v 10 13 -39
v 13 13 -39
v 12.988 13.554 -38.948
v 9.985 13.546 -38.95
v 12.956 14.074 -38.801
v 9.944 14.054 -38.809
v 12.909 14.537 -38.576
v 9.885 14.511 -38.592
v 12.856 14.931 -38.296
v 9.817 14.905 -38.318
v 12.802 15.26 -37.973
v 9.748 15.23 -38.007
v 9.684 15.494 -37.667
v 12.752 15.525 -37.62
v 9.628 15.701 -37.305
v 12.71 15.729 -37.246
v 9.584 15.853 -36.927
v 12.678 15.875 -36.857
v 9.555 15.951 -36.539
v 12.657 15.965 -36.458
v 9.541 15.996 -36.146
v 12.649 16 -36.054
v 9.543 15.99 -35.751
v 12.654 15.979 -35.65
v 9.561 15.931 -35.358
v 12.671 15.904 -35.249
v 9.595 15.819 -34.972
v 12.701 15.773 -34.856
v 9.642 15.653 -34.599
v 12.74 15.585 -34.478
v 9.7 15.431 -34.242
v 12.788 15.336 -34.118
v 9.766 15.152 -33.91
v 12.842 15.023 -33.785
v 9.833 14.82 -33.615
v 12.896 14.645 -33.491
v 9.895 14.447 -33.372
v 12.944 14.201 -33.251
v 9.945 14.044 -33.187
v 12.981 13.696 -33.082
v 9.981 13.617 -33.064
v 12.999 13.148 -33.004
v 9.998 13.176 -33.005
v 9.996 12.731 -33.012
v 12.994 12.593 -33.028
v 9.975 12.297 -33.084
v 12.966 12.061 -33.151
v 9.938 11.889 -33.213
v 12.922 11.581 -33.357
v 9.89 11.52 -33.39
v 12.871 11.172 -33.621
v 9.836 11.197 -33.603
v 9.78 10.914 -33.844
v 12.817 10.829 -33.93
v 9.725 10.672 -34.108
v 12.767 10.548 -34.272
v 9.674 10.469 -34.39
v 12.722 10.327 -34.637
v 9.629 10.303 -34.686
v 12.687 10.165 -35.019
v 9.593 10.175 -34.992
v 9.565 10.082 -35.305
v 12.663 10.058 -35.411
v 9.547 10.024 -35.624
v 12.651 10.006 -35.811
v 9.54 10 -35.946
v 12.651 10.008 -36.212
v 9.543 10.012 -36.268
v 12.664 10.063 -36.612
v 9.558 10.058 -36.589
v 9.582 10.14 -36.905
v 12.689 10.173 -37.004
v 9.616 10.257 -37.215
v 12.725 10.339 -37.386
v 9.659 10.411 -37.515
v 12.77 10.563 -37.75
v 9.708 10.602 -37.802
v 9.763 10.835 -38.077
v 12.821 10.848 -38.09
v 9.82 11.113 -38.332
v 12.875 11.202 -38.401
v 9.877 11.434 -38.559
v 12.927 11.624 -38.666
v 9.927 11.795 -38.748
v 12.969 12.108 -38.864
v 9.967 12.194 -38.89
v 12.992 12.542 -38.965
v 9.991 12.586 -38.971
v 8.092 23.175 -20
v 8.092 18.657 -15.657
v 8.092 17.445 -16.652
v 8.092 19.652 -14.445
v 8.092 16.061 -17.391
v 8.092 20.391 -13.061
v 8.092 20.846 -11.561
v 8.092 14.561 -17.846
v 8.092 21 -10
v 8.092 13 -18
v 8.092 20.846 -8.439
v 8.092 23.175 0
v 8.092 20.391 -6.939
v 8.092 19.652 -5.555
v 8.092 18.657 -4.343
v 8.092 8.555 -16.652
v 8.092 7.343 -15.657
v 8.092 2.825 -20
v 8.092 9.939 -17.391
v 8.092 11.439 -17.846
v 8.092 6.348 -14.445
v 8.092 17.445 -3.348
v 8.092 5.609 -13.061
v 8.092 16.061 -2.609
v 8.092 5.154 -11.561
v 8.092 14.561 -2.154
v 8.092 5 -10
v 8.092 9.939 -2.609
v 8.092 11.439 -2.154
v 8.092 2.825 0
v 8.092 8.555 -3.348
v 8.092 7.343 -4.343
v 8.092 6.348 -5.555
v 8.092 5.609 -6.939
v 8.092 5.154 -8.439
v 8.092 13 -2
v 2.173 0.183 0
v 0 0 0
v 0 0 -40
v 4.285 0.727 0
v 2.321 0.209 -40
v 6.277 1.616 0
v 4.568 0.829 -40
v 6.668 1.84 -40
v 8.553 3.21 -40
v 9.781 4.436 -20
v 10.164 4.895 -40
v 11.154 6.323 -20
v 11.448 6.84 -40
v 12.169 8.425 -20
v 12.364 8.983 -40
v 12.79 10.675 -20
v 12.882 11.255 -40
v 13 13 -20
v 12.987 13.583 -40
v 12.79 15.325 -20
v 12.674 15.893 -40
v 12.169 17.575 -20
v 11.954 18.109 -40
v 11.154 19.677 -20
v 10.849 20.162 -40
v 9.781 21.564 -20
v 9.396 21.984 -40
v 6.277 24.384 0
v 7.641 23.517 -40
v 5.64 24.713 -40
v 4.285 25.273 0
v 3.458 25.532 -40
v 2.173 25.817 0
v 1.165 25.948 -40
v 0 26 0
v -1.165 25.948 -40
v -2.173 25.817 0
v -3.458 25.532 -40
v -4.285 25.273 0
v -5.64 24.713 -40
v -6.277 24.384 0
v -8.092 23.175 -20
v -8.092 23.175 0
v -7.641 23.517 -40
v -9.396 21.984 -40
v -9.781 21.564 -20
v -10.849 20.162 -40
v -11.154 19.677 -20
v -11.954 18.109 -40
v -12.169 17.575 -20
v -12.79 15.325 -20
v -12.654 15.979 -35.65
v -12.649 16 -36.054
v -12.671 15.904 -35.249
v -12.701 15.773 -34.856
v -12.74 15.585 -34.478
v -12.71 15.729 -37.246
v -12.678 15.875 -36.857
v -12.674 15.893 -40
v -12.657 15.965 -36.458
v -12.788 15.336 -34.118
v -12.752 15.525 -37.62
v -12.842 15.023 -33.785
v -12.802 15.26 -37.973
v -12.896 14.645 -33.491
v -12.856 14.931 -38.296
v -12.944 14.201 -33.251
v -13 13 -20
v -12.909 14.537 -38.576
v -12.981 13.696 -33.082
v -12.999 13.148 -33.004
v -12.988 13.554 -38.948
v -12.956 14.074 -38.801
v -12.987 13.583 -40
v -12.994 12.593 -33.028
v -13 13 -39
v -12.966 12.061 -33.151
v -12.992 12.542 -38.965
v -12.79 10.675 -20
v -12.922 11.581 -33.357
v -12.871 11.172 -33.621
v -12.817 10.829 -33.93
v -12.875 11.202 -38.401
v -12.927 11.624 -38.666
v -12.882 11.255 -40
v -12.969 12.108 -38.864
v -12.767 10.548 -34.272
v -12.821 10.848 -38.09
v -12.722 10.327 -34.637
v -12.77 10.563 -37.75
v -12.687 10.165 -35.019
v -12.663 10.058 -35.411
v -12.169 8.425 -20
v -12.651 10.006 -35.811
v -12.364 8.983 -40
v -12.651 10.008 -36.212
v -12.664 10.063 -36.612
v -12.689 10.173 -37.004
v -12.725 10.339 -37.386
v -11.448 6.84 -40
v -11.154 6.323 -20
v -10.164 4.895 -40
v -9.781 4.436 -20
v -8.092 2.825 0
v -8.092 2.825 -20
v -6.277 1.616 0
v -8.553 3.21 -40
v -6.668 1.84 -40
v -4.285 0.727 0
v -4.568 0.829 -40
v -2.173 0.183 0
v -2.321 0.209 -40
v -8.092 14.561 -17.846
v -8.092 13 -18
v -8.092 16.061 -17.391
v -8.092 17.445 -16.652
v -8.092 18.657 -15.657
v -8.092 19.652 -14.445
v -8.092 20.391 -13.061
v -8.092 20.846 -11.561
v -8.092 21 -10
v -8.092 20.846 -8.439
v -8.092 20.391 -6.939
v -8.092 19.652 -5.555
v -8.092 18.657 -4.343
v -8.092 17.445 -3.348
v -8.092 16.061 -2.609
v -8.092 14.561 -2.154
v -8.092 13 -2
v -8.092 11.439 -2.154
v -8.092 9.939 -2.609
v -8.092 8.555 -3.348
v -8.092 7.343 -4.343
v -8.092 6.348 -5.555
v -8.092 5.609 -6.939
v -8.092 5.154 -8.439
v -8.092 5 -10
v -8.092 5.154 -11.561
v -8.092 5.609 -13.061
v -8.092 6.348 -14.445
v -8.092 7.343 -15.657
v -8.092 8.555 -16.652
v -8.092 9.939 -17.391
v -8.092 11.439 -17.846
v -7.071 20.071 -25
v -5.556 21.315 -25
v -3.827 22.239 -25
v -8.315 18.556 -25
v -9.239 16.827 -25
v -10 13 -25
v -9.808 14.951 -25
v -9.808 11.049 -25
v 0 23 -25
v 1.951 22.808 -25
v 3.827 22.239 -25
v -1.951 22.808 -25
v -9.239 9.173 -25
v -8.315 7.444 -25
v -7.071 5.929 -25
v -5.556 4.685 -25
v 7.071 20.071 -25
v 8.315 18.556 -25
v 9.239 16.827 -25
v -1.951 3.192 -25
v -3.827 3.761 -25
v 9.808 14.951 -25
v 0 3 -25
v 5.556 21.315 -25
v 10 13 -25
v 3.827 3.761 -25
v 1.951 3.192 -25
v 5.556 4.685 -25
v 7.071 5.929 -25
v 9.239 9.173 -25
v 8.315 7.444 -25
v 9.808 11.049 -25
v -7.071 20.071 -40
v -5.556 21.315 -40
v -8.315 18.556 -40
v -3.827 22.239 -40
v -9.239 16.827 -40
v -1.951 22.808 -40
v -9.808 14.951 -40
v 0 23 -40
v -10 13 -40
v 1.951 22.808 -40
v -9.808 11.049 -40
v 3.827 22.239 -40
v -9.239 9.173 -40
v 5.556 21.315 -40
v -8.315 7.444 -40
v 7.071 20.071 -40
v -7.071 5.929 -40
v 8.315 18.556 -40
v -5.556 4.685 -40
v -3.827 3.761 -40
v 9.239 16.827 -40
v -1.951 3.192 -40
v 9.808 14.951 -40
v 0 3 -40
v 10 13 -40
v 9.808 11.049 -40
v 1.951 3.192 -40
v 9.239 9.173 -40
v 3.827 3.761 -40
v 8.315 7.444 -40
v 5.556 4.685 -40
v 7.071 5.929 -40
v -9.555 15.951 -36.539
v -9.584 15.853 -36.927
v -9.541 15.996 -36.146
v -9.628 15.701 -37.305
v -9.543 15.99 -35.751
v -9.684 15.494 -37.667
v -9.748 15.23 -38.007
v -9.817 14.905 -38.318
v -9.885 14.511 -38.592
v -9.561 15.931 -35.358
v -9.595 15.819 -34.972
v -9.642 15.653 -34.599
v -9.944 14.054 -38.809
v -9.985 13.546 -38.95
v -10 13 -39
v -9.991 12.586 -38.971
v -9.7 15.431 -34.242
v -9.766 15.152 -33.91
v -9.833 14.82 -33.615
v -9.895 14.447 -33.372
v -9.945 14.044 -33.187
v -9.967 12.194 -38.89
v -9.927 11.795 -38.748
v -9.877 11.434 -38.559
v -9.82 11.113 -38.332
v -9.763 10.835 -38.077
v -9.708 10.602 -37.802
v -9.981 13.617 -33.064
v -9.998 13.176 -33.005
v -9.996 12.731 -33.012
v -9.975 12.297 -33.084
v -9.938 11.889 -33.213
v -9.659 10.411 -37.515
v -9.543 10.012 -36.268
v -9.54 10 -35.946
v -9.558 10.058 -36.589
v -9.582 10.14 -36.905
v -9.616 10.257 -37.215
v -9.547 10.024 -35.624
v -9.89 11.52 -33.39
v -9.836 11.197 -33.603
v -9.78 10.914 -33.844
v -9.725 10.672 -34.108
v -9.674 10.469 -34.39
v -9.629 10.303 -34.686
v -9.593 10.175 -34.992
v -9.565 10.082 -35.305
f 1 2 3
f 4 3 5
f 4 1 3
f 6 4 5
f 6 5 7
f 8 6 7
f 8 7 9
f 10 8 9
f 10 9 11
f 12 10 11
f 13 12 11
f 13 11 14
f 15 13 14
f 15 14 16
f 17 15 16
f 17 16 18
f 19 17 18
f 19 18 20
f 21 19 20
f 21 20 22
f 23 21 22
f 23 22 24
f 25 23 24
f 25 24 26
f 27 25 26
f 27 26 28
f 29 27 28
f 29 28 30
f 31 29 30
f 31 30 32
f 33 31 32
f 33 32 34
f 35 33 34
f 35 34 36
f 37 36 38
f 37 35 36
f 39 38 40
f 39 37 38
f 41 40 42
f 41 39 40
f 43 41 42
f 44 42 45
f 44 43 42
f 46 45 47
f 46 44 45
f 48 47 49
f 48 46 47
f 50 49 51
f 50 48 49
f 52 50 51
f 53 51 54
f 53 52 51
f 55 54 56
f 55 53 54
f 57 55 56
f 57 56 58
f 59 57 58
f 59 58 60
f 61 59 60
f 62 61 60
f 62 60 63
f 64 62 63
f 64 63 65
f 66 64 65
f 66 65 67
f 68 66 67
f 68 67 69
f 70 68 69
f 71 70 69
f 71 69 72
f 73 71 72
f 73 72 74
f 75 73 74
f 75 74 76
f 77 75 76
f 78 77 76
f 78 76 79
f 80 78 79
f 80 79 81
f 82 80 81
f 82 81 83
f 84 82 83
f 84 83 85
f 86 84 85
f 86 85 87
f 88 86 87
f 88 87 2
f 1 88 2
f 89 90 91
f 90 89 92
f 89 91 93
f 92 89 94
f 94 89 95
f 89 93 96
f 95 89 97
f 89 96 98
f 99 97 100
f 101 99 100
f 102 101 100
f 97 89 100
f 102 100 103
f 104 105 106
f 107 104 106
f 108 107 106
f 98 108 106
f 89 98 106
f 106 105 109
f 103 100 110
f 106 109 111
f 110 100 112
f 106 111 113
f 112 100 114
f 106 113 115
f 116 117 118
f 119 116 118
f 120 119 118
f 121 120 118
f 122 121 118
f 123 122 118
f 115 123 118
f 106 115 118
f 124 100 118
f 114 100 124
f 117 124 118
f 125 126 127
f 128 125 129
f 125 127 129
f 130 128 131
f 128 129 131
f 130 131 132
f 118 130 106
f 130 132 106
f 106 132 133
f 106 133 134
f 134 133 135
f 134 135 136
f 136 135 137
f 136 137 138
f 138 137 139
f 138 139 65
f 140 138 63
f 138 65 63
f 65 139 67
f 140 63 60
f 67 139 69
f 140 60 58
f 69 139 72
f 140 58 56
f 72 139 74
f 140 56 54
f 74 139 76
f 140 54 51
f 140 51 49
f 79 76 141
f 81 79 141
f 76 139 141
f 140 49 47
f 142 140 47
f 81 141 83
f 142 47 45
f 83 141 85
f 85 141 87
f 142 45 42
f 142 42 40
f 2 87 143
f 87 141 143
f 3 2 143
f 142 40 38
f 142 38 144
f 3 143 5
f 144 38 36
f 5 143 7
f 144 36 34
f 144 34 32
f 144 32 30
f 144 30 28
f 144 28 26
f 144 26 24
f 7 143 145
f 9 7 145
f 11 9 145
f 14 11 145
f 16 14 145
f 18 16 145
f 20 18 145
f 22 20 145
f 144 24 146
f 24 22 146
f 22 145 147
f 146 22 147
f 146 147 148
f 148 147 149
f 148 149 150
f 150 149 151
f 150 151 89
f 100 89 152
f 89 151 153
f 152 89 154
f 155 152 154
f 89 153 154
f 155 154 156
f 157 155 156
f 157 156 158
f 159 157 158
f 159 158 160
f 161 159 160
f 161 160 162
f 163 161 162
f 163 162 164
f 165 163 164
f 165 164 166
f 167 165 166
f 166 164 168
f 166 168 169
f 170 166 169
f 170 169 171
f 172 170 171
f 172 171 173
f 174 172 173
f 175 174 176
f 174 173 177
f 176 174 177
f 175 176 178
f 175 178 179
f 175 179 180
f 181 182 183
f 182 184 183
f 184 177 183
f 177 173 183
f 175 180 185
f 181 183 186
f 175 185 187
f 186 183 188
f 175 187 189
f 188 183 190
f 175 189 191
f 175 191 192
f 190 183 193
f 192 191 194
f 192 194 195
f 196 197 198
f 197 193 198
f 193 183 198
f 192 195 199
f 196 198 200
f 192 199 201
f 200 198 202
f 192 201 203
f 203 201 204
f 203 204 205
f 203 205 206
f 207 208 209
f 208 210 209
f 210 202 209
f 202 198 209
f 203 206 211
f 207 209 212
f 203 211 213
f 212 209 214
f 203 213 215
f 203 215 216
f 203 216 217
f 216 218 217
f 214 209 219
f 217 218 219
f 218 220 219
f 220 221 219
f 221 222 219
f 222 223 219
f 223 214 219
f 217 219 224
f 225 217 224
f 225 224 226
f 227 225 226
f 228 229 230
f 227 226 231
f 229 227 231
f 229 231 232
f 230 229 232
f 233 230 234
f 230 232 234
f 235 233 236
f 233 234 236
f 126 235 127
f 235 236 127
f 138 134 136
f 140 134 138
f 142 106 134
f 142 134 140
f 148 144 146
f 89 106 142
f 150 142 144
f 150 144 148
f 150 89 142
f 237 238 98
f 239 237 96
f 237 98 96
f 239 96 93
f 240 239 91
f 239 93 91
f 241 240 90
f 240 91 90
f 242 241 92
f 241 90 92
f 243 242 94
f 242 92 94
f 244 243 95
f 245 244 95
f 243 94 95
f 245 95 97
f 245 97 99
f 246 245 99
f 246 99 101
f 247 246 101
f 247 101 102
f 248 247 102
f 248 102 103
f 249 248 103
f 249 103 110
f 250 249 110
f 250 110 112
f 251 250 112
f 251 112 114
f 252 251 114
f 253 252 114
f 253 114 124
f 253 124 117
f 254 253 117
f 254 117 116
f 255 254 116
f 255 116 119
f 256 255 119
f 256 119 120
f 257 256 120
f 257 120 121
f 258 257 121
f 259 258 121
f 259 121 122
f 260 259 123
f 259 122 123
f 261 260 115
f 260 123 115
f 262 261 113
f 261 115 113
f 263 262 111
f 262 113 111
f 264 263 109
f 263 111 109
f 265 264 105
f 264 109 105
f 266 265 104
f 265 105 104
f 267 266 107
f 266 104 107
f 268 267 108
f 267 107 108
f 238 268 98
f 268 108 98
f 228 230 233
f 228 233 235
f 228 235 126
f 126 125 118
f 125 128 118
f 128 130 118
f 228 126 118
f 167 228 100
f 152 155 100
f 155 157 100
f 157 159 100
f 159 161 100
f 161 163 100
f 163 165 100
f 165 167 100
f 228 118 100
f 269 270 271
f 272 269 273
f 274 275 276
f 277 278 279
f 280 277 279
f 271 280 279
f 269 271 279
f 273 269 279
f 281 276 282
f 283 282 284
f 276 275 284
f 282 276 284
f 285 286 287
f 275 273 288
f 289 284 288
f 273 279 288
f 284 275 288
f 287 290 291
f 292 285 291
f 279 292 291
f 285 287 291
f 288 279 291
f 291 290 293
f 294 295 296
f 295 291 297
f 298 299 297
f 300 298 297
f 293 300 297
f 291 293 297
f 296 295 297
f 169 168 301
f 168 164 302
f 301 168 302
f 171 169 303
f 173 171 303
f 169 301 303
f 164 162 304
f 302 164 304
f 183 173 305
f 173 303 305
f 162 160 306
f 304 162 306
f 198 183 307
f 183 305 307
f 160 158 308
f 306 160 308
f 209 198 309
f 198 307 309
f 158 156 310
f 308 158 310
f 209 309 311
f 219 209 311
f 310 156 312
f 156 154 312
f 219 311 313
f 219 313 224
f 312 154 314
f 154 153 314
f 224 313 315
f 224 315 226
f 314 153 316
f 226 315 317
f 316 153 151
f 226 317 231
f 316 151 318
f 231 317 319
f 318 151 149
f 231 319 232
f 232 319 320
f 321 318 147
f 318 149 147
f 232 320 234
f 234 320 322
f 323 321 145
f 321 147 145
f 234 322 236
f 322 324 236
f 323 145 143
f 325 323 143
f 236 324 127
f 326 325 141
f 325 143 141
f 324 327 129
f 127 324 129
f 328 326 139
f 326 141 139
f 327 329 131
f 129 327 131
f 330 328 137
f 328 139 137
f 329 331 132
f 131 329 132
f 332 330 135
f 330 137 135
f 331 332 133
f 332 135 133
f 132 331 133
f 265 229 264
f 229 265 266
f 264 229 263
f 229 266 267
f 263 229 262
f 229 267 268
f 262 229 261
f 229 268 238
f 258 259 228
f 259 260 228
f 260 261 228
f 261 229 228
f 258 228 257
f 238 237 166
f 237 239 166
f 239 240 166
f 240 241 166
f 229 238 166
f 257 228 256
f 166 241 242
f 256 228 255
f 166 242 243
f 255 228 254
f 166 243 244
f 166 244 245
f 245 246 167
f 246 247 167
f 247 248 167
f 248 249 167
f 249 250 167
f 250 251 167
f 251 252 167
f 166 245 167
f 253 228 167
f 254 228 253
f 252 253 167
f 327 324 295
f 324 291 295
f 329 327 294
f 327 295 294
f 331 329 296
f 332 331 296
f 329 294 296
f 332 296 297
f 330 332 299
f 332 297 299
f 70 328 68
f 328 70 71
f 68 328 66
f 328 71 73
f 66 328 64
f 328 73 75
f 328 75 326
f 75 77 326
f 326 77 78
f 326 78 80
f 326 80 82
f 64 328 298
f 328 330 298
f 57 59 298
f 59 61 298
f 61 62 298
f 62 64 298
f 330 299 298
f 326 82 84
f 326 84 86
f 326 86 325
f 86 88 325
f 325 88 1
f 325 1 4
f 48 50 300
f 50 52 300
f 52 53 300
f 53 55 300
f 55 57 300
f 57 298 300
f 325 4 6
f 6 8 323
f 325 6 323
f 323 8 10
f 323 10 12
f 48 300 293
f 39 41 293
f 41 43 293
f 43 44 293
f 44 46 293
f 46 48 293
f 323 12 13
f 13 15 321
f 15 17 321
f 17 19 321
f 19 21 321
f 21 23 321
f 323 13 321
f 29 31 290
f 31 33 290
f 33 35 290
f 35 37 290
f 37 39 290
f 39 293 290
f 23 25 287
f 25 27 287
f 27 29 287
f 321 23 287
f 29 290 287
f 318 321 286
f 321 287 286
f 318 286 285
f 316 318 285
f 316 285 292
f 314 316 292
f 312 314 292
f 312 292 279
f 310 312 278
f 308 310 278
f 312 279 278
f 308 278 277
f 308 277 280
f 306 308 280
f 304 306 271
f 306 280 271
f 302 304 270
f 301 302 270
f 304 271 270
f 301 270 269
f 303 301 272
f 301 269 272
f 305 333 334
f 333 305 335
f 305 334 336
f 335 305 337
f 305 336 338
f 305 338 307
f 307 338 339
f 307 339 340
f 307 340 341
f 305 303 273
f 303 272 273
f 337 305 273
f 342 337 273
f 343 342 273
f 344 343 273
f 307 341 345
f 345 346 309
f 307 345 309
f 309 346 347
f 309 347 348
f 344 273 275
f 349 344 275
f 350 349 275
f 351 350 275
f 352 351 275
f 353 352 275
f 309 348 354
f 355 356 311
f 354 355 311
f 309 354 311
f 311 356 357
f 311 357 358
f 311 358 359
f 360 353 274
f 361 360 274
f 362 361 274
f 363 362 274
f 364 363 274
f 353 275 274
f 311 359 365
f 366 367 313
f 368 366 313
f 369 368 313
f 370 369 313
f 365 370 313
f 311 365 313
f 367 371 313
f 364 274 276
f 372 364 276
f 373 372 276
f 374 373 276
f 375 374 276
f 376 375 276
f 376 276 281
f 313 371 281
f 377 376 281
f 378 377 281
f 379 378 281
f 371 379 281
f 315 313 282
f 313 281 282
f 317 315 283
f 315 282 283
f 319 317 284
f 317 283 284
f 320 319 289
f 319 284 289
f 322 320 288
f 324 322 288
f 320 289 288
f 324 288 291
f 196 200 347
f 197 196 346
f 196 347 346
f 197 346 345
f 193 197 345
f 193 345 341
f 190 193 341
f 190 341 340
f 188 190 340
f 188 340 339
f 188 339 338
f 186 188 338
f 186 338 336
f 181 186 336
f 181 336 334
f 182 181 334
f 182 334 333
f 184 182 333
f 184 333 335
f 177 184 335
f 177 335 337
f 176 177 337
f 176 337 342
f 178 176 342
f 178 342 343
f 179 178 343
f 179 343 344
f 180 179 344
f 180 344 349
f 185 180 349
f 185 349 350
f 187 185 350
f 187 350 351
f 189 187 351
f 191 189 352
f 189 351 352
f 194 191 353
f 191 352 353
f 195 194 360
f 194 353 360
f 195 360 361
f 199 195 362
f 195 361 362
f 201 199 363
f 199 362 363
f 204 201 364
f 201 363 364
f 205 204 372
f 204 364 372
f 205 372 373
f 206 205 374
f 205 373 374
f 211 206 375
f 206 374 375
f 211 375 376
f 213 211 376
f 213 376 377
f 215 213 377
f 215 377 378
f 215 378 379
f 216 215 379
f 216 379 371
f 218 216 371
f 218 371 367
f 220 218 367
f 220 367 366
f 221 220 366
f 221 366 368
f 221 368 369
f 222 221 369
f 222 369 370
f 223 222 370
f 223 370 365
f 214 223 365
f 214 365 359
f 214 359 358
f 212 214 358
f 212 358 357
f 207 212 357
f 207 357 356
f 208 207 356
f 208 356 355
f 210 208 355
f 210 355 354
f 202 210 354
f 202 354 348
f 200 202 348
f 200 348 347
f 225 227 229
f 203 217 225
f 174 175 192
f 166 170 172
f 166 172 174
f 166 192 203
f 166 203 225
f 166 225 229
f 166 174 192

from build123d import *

# Parameters (mm, degrees)
CUT_EXTRUDE1_DEPTH      = 20
SKETCH6_R               = 8
CUT_EXTRUDE2_DEPTH      = 30
SKETCH7_R               = 3
CUT_EXTRUDE3_DEPTH      = 30
CUT_EXTRUDE3_DEPTH_BACK = 30


with BuildPart() as part:
    # Sketch2 → Revolve1 (revolve)
    with BuildSketch(Plane(origin=(0, 0, 0), x_dir=(0, 0, -1), z_dir=(1, 0, 0))):
        Polygon((0, 13), (0, 0), (40, 0), (40, 3), (25, 3), (25, 13), align=None)
    revolve(axis=Axis((0, 13, -25), (0, 0, 1)))

    # Sketch5 → Cut-Extrude1 (cut)
    with BuildSketch(Plane.XY):
        with BuildLine():
            ThreePointArc((13, 13), (11.708749973, 18.648466524), (8.091511681, 23.174843424))
            Line((8.091511681, 23.174843424), (8.091511681, 2.825156576))
            ThreePointArc((8.091511681, 2.825156576), (11.708749973, 7.351533476), (13, 13))
        make_face()
        with BuildLine():
            Line((-8.091511681, 2.825156576), (-8.091511681, 23.174843424))
            ThreePointArc((-8.091511681, 23.174843424), (-13, 13), (-8.091511681, 2.825156576))
        make_face()
    extrude(amount=-CUT_EXTRUDE1_DEPTH, mode=Mode.SUBTRACT)

    # Sketch6 → Cut-Extrude2 (cut)
    with BuildSketch(Plane(origin=(8.091511681, 0, 0), x_dir=(0, 0, -1), z_dir=(1, 0, 0))):
        with Locations((10, 13)):
            Circle(SKETCH6_R)
    extrude(amount=-CUT_EXTRUDE2_DEPTH, mode=Mode.SUBTRACT)

    # Sketch7 → Cut-Extrude3 (cut, two sides)
    with BuildSketch(Plane(origin=(0, 0, 0), x_dir=(0, 0, -1), z_dir=(1, 0, 0))) as cut_extrude3_sk:
        with Locations((36, 13)):
            Circle(SKETCH7_R)
    extrude(amount=CUT_EXTRUDE3_DEPTH, mode=Mode.SUBTRACT)
    extrude(cut_extrude3_sk.sketch, amount=-CUT_EXTRUDE3_DEPTH_BACK, mode=Mode.SUBTRACT)


solid = part.part
